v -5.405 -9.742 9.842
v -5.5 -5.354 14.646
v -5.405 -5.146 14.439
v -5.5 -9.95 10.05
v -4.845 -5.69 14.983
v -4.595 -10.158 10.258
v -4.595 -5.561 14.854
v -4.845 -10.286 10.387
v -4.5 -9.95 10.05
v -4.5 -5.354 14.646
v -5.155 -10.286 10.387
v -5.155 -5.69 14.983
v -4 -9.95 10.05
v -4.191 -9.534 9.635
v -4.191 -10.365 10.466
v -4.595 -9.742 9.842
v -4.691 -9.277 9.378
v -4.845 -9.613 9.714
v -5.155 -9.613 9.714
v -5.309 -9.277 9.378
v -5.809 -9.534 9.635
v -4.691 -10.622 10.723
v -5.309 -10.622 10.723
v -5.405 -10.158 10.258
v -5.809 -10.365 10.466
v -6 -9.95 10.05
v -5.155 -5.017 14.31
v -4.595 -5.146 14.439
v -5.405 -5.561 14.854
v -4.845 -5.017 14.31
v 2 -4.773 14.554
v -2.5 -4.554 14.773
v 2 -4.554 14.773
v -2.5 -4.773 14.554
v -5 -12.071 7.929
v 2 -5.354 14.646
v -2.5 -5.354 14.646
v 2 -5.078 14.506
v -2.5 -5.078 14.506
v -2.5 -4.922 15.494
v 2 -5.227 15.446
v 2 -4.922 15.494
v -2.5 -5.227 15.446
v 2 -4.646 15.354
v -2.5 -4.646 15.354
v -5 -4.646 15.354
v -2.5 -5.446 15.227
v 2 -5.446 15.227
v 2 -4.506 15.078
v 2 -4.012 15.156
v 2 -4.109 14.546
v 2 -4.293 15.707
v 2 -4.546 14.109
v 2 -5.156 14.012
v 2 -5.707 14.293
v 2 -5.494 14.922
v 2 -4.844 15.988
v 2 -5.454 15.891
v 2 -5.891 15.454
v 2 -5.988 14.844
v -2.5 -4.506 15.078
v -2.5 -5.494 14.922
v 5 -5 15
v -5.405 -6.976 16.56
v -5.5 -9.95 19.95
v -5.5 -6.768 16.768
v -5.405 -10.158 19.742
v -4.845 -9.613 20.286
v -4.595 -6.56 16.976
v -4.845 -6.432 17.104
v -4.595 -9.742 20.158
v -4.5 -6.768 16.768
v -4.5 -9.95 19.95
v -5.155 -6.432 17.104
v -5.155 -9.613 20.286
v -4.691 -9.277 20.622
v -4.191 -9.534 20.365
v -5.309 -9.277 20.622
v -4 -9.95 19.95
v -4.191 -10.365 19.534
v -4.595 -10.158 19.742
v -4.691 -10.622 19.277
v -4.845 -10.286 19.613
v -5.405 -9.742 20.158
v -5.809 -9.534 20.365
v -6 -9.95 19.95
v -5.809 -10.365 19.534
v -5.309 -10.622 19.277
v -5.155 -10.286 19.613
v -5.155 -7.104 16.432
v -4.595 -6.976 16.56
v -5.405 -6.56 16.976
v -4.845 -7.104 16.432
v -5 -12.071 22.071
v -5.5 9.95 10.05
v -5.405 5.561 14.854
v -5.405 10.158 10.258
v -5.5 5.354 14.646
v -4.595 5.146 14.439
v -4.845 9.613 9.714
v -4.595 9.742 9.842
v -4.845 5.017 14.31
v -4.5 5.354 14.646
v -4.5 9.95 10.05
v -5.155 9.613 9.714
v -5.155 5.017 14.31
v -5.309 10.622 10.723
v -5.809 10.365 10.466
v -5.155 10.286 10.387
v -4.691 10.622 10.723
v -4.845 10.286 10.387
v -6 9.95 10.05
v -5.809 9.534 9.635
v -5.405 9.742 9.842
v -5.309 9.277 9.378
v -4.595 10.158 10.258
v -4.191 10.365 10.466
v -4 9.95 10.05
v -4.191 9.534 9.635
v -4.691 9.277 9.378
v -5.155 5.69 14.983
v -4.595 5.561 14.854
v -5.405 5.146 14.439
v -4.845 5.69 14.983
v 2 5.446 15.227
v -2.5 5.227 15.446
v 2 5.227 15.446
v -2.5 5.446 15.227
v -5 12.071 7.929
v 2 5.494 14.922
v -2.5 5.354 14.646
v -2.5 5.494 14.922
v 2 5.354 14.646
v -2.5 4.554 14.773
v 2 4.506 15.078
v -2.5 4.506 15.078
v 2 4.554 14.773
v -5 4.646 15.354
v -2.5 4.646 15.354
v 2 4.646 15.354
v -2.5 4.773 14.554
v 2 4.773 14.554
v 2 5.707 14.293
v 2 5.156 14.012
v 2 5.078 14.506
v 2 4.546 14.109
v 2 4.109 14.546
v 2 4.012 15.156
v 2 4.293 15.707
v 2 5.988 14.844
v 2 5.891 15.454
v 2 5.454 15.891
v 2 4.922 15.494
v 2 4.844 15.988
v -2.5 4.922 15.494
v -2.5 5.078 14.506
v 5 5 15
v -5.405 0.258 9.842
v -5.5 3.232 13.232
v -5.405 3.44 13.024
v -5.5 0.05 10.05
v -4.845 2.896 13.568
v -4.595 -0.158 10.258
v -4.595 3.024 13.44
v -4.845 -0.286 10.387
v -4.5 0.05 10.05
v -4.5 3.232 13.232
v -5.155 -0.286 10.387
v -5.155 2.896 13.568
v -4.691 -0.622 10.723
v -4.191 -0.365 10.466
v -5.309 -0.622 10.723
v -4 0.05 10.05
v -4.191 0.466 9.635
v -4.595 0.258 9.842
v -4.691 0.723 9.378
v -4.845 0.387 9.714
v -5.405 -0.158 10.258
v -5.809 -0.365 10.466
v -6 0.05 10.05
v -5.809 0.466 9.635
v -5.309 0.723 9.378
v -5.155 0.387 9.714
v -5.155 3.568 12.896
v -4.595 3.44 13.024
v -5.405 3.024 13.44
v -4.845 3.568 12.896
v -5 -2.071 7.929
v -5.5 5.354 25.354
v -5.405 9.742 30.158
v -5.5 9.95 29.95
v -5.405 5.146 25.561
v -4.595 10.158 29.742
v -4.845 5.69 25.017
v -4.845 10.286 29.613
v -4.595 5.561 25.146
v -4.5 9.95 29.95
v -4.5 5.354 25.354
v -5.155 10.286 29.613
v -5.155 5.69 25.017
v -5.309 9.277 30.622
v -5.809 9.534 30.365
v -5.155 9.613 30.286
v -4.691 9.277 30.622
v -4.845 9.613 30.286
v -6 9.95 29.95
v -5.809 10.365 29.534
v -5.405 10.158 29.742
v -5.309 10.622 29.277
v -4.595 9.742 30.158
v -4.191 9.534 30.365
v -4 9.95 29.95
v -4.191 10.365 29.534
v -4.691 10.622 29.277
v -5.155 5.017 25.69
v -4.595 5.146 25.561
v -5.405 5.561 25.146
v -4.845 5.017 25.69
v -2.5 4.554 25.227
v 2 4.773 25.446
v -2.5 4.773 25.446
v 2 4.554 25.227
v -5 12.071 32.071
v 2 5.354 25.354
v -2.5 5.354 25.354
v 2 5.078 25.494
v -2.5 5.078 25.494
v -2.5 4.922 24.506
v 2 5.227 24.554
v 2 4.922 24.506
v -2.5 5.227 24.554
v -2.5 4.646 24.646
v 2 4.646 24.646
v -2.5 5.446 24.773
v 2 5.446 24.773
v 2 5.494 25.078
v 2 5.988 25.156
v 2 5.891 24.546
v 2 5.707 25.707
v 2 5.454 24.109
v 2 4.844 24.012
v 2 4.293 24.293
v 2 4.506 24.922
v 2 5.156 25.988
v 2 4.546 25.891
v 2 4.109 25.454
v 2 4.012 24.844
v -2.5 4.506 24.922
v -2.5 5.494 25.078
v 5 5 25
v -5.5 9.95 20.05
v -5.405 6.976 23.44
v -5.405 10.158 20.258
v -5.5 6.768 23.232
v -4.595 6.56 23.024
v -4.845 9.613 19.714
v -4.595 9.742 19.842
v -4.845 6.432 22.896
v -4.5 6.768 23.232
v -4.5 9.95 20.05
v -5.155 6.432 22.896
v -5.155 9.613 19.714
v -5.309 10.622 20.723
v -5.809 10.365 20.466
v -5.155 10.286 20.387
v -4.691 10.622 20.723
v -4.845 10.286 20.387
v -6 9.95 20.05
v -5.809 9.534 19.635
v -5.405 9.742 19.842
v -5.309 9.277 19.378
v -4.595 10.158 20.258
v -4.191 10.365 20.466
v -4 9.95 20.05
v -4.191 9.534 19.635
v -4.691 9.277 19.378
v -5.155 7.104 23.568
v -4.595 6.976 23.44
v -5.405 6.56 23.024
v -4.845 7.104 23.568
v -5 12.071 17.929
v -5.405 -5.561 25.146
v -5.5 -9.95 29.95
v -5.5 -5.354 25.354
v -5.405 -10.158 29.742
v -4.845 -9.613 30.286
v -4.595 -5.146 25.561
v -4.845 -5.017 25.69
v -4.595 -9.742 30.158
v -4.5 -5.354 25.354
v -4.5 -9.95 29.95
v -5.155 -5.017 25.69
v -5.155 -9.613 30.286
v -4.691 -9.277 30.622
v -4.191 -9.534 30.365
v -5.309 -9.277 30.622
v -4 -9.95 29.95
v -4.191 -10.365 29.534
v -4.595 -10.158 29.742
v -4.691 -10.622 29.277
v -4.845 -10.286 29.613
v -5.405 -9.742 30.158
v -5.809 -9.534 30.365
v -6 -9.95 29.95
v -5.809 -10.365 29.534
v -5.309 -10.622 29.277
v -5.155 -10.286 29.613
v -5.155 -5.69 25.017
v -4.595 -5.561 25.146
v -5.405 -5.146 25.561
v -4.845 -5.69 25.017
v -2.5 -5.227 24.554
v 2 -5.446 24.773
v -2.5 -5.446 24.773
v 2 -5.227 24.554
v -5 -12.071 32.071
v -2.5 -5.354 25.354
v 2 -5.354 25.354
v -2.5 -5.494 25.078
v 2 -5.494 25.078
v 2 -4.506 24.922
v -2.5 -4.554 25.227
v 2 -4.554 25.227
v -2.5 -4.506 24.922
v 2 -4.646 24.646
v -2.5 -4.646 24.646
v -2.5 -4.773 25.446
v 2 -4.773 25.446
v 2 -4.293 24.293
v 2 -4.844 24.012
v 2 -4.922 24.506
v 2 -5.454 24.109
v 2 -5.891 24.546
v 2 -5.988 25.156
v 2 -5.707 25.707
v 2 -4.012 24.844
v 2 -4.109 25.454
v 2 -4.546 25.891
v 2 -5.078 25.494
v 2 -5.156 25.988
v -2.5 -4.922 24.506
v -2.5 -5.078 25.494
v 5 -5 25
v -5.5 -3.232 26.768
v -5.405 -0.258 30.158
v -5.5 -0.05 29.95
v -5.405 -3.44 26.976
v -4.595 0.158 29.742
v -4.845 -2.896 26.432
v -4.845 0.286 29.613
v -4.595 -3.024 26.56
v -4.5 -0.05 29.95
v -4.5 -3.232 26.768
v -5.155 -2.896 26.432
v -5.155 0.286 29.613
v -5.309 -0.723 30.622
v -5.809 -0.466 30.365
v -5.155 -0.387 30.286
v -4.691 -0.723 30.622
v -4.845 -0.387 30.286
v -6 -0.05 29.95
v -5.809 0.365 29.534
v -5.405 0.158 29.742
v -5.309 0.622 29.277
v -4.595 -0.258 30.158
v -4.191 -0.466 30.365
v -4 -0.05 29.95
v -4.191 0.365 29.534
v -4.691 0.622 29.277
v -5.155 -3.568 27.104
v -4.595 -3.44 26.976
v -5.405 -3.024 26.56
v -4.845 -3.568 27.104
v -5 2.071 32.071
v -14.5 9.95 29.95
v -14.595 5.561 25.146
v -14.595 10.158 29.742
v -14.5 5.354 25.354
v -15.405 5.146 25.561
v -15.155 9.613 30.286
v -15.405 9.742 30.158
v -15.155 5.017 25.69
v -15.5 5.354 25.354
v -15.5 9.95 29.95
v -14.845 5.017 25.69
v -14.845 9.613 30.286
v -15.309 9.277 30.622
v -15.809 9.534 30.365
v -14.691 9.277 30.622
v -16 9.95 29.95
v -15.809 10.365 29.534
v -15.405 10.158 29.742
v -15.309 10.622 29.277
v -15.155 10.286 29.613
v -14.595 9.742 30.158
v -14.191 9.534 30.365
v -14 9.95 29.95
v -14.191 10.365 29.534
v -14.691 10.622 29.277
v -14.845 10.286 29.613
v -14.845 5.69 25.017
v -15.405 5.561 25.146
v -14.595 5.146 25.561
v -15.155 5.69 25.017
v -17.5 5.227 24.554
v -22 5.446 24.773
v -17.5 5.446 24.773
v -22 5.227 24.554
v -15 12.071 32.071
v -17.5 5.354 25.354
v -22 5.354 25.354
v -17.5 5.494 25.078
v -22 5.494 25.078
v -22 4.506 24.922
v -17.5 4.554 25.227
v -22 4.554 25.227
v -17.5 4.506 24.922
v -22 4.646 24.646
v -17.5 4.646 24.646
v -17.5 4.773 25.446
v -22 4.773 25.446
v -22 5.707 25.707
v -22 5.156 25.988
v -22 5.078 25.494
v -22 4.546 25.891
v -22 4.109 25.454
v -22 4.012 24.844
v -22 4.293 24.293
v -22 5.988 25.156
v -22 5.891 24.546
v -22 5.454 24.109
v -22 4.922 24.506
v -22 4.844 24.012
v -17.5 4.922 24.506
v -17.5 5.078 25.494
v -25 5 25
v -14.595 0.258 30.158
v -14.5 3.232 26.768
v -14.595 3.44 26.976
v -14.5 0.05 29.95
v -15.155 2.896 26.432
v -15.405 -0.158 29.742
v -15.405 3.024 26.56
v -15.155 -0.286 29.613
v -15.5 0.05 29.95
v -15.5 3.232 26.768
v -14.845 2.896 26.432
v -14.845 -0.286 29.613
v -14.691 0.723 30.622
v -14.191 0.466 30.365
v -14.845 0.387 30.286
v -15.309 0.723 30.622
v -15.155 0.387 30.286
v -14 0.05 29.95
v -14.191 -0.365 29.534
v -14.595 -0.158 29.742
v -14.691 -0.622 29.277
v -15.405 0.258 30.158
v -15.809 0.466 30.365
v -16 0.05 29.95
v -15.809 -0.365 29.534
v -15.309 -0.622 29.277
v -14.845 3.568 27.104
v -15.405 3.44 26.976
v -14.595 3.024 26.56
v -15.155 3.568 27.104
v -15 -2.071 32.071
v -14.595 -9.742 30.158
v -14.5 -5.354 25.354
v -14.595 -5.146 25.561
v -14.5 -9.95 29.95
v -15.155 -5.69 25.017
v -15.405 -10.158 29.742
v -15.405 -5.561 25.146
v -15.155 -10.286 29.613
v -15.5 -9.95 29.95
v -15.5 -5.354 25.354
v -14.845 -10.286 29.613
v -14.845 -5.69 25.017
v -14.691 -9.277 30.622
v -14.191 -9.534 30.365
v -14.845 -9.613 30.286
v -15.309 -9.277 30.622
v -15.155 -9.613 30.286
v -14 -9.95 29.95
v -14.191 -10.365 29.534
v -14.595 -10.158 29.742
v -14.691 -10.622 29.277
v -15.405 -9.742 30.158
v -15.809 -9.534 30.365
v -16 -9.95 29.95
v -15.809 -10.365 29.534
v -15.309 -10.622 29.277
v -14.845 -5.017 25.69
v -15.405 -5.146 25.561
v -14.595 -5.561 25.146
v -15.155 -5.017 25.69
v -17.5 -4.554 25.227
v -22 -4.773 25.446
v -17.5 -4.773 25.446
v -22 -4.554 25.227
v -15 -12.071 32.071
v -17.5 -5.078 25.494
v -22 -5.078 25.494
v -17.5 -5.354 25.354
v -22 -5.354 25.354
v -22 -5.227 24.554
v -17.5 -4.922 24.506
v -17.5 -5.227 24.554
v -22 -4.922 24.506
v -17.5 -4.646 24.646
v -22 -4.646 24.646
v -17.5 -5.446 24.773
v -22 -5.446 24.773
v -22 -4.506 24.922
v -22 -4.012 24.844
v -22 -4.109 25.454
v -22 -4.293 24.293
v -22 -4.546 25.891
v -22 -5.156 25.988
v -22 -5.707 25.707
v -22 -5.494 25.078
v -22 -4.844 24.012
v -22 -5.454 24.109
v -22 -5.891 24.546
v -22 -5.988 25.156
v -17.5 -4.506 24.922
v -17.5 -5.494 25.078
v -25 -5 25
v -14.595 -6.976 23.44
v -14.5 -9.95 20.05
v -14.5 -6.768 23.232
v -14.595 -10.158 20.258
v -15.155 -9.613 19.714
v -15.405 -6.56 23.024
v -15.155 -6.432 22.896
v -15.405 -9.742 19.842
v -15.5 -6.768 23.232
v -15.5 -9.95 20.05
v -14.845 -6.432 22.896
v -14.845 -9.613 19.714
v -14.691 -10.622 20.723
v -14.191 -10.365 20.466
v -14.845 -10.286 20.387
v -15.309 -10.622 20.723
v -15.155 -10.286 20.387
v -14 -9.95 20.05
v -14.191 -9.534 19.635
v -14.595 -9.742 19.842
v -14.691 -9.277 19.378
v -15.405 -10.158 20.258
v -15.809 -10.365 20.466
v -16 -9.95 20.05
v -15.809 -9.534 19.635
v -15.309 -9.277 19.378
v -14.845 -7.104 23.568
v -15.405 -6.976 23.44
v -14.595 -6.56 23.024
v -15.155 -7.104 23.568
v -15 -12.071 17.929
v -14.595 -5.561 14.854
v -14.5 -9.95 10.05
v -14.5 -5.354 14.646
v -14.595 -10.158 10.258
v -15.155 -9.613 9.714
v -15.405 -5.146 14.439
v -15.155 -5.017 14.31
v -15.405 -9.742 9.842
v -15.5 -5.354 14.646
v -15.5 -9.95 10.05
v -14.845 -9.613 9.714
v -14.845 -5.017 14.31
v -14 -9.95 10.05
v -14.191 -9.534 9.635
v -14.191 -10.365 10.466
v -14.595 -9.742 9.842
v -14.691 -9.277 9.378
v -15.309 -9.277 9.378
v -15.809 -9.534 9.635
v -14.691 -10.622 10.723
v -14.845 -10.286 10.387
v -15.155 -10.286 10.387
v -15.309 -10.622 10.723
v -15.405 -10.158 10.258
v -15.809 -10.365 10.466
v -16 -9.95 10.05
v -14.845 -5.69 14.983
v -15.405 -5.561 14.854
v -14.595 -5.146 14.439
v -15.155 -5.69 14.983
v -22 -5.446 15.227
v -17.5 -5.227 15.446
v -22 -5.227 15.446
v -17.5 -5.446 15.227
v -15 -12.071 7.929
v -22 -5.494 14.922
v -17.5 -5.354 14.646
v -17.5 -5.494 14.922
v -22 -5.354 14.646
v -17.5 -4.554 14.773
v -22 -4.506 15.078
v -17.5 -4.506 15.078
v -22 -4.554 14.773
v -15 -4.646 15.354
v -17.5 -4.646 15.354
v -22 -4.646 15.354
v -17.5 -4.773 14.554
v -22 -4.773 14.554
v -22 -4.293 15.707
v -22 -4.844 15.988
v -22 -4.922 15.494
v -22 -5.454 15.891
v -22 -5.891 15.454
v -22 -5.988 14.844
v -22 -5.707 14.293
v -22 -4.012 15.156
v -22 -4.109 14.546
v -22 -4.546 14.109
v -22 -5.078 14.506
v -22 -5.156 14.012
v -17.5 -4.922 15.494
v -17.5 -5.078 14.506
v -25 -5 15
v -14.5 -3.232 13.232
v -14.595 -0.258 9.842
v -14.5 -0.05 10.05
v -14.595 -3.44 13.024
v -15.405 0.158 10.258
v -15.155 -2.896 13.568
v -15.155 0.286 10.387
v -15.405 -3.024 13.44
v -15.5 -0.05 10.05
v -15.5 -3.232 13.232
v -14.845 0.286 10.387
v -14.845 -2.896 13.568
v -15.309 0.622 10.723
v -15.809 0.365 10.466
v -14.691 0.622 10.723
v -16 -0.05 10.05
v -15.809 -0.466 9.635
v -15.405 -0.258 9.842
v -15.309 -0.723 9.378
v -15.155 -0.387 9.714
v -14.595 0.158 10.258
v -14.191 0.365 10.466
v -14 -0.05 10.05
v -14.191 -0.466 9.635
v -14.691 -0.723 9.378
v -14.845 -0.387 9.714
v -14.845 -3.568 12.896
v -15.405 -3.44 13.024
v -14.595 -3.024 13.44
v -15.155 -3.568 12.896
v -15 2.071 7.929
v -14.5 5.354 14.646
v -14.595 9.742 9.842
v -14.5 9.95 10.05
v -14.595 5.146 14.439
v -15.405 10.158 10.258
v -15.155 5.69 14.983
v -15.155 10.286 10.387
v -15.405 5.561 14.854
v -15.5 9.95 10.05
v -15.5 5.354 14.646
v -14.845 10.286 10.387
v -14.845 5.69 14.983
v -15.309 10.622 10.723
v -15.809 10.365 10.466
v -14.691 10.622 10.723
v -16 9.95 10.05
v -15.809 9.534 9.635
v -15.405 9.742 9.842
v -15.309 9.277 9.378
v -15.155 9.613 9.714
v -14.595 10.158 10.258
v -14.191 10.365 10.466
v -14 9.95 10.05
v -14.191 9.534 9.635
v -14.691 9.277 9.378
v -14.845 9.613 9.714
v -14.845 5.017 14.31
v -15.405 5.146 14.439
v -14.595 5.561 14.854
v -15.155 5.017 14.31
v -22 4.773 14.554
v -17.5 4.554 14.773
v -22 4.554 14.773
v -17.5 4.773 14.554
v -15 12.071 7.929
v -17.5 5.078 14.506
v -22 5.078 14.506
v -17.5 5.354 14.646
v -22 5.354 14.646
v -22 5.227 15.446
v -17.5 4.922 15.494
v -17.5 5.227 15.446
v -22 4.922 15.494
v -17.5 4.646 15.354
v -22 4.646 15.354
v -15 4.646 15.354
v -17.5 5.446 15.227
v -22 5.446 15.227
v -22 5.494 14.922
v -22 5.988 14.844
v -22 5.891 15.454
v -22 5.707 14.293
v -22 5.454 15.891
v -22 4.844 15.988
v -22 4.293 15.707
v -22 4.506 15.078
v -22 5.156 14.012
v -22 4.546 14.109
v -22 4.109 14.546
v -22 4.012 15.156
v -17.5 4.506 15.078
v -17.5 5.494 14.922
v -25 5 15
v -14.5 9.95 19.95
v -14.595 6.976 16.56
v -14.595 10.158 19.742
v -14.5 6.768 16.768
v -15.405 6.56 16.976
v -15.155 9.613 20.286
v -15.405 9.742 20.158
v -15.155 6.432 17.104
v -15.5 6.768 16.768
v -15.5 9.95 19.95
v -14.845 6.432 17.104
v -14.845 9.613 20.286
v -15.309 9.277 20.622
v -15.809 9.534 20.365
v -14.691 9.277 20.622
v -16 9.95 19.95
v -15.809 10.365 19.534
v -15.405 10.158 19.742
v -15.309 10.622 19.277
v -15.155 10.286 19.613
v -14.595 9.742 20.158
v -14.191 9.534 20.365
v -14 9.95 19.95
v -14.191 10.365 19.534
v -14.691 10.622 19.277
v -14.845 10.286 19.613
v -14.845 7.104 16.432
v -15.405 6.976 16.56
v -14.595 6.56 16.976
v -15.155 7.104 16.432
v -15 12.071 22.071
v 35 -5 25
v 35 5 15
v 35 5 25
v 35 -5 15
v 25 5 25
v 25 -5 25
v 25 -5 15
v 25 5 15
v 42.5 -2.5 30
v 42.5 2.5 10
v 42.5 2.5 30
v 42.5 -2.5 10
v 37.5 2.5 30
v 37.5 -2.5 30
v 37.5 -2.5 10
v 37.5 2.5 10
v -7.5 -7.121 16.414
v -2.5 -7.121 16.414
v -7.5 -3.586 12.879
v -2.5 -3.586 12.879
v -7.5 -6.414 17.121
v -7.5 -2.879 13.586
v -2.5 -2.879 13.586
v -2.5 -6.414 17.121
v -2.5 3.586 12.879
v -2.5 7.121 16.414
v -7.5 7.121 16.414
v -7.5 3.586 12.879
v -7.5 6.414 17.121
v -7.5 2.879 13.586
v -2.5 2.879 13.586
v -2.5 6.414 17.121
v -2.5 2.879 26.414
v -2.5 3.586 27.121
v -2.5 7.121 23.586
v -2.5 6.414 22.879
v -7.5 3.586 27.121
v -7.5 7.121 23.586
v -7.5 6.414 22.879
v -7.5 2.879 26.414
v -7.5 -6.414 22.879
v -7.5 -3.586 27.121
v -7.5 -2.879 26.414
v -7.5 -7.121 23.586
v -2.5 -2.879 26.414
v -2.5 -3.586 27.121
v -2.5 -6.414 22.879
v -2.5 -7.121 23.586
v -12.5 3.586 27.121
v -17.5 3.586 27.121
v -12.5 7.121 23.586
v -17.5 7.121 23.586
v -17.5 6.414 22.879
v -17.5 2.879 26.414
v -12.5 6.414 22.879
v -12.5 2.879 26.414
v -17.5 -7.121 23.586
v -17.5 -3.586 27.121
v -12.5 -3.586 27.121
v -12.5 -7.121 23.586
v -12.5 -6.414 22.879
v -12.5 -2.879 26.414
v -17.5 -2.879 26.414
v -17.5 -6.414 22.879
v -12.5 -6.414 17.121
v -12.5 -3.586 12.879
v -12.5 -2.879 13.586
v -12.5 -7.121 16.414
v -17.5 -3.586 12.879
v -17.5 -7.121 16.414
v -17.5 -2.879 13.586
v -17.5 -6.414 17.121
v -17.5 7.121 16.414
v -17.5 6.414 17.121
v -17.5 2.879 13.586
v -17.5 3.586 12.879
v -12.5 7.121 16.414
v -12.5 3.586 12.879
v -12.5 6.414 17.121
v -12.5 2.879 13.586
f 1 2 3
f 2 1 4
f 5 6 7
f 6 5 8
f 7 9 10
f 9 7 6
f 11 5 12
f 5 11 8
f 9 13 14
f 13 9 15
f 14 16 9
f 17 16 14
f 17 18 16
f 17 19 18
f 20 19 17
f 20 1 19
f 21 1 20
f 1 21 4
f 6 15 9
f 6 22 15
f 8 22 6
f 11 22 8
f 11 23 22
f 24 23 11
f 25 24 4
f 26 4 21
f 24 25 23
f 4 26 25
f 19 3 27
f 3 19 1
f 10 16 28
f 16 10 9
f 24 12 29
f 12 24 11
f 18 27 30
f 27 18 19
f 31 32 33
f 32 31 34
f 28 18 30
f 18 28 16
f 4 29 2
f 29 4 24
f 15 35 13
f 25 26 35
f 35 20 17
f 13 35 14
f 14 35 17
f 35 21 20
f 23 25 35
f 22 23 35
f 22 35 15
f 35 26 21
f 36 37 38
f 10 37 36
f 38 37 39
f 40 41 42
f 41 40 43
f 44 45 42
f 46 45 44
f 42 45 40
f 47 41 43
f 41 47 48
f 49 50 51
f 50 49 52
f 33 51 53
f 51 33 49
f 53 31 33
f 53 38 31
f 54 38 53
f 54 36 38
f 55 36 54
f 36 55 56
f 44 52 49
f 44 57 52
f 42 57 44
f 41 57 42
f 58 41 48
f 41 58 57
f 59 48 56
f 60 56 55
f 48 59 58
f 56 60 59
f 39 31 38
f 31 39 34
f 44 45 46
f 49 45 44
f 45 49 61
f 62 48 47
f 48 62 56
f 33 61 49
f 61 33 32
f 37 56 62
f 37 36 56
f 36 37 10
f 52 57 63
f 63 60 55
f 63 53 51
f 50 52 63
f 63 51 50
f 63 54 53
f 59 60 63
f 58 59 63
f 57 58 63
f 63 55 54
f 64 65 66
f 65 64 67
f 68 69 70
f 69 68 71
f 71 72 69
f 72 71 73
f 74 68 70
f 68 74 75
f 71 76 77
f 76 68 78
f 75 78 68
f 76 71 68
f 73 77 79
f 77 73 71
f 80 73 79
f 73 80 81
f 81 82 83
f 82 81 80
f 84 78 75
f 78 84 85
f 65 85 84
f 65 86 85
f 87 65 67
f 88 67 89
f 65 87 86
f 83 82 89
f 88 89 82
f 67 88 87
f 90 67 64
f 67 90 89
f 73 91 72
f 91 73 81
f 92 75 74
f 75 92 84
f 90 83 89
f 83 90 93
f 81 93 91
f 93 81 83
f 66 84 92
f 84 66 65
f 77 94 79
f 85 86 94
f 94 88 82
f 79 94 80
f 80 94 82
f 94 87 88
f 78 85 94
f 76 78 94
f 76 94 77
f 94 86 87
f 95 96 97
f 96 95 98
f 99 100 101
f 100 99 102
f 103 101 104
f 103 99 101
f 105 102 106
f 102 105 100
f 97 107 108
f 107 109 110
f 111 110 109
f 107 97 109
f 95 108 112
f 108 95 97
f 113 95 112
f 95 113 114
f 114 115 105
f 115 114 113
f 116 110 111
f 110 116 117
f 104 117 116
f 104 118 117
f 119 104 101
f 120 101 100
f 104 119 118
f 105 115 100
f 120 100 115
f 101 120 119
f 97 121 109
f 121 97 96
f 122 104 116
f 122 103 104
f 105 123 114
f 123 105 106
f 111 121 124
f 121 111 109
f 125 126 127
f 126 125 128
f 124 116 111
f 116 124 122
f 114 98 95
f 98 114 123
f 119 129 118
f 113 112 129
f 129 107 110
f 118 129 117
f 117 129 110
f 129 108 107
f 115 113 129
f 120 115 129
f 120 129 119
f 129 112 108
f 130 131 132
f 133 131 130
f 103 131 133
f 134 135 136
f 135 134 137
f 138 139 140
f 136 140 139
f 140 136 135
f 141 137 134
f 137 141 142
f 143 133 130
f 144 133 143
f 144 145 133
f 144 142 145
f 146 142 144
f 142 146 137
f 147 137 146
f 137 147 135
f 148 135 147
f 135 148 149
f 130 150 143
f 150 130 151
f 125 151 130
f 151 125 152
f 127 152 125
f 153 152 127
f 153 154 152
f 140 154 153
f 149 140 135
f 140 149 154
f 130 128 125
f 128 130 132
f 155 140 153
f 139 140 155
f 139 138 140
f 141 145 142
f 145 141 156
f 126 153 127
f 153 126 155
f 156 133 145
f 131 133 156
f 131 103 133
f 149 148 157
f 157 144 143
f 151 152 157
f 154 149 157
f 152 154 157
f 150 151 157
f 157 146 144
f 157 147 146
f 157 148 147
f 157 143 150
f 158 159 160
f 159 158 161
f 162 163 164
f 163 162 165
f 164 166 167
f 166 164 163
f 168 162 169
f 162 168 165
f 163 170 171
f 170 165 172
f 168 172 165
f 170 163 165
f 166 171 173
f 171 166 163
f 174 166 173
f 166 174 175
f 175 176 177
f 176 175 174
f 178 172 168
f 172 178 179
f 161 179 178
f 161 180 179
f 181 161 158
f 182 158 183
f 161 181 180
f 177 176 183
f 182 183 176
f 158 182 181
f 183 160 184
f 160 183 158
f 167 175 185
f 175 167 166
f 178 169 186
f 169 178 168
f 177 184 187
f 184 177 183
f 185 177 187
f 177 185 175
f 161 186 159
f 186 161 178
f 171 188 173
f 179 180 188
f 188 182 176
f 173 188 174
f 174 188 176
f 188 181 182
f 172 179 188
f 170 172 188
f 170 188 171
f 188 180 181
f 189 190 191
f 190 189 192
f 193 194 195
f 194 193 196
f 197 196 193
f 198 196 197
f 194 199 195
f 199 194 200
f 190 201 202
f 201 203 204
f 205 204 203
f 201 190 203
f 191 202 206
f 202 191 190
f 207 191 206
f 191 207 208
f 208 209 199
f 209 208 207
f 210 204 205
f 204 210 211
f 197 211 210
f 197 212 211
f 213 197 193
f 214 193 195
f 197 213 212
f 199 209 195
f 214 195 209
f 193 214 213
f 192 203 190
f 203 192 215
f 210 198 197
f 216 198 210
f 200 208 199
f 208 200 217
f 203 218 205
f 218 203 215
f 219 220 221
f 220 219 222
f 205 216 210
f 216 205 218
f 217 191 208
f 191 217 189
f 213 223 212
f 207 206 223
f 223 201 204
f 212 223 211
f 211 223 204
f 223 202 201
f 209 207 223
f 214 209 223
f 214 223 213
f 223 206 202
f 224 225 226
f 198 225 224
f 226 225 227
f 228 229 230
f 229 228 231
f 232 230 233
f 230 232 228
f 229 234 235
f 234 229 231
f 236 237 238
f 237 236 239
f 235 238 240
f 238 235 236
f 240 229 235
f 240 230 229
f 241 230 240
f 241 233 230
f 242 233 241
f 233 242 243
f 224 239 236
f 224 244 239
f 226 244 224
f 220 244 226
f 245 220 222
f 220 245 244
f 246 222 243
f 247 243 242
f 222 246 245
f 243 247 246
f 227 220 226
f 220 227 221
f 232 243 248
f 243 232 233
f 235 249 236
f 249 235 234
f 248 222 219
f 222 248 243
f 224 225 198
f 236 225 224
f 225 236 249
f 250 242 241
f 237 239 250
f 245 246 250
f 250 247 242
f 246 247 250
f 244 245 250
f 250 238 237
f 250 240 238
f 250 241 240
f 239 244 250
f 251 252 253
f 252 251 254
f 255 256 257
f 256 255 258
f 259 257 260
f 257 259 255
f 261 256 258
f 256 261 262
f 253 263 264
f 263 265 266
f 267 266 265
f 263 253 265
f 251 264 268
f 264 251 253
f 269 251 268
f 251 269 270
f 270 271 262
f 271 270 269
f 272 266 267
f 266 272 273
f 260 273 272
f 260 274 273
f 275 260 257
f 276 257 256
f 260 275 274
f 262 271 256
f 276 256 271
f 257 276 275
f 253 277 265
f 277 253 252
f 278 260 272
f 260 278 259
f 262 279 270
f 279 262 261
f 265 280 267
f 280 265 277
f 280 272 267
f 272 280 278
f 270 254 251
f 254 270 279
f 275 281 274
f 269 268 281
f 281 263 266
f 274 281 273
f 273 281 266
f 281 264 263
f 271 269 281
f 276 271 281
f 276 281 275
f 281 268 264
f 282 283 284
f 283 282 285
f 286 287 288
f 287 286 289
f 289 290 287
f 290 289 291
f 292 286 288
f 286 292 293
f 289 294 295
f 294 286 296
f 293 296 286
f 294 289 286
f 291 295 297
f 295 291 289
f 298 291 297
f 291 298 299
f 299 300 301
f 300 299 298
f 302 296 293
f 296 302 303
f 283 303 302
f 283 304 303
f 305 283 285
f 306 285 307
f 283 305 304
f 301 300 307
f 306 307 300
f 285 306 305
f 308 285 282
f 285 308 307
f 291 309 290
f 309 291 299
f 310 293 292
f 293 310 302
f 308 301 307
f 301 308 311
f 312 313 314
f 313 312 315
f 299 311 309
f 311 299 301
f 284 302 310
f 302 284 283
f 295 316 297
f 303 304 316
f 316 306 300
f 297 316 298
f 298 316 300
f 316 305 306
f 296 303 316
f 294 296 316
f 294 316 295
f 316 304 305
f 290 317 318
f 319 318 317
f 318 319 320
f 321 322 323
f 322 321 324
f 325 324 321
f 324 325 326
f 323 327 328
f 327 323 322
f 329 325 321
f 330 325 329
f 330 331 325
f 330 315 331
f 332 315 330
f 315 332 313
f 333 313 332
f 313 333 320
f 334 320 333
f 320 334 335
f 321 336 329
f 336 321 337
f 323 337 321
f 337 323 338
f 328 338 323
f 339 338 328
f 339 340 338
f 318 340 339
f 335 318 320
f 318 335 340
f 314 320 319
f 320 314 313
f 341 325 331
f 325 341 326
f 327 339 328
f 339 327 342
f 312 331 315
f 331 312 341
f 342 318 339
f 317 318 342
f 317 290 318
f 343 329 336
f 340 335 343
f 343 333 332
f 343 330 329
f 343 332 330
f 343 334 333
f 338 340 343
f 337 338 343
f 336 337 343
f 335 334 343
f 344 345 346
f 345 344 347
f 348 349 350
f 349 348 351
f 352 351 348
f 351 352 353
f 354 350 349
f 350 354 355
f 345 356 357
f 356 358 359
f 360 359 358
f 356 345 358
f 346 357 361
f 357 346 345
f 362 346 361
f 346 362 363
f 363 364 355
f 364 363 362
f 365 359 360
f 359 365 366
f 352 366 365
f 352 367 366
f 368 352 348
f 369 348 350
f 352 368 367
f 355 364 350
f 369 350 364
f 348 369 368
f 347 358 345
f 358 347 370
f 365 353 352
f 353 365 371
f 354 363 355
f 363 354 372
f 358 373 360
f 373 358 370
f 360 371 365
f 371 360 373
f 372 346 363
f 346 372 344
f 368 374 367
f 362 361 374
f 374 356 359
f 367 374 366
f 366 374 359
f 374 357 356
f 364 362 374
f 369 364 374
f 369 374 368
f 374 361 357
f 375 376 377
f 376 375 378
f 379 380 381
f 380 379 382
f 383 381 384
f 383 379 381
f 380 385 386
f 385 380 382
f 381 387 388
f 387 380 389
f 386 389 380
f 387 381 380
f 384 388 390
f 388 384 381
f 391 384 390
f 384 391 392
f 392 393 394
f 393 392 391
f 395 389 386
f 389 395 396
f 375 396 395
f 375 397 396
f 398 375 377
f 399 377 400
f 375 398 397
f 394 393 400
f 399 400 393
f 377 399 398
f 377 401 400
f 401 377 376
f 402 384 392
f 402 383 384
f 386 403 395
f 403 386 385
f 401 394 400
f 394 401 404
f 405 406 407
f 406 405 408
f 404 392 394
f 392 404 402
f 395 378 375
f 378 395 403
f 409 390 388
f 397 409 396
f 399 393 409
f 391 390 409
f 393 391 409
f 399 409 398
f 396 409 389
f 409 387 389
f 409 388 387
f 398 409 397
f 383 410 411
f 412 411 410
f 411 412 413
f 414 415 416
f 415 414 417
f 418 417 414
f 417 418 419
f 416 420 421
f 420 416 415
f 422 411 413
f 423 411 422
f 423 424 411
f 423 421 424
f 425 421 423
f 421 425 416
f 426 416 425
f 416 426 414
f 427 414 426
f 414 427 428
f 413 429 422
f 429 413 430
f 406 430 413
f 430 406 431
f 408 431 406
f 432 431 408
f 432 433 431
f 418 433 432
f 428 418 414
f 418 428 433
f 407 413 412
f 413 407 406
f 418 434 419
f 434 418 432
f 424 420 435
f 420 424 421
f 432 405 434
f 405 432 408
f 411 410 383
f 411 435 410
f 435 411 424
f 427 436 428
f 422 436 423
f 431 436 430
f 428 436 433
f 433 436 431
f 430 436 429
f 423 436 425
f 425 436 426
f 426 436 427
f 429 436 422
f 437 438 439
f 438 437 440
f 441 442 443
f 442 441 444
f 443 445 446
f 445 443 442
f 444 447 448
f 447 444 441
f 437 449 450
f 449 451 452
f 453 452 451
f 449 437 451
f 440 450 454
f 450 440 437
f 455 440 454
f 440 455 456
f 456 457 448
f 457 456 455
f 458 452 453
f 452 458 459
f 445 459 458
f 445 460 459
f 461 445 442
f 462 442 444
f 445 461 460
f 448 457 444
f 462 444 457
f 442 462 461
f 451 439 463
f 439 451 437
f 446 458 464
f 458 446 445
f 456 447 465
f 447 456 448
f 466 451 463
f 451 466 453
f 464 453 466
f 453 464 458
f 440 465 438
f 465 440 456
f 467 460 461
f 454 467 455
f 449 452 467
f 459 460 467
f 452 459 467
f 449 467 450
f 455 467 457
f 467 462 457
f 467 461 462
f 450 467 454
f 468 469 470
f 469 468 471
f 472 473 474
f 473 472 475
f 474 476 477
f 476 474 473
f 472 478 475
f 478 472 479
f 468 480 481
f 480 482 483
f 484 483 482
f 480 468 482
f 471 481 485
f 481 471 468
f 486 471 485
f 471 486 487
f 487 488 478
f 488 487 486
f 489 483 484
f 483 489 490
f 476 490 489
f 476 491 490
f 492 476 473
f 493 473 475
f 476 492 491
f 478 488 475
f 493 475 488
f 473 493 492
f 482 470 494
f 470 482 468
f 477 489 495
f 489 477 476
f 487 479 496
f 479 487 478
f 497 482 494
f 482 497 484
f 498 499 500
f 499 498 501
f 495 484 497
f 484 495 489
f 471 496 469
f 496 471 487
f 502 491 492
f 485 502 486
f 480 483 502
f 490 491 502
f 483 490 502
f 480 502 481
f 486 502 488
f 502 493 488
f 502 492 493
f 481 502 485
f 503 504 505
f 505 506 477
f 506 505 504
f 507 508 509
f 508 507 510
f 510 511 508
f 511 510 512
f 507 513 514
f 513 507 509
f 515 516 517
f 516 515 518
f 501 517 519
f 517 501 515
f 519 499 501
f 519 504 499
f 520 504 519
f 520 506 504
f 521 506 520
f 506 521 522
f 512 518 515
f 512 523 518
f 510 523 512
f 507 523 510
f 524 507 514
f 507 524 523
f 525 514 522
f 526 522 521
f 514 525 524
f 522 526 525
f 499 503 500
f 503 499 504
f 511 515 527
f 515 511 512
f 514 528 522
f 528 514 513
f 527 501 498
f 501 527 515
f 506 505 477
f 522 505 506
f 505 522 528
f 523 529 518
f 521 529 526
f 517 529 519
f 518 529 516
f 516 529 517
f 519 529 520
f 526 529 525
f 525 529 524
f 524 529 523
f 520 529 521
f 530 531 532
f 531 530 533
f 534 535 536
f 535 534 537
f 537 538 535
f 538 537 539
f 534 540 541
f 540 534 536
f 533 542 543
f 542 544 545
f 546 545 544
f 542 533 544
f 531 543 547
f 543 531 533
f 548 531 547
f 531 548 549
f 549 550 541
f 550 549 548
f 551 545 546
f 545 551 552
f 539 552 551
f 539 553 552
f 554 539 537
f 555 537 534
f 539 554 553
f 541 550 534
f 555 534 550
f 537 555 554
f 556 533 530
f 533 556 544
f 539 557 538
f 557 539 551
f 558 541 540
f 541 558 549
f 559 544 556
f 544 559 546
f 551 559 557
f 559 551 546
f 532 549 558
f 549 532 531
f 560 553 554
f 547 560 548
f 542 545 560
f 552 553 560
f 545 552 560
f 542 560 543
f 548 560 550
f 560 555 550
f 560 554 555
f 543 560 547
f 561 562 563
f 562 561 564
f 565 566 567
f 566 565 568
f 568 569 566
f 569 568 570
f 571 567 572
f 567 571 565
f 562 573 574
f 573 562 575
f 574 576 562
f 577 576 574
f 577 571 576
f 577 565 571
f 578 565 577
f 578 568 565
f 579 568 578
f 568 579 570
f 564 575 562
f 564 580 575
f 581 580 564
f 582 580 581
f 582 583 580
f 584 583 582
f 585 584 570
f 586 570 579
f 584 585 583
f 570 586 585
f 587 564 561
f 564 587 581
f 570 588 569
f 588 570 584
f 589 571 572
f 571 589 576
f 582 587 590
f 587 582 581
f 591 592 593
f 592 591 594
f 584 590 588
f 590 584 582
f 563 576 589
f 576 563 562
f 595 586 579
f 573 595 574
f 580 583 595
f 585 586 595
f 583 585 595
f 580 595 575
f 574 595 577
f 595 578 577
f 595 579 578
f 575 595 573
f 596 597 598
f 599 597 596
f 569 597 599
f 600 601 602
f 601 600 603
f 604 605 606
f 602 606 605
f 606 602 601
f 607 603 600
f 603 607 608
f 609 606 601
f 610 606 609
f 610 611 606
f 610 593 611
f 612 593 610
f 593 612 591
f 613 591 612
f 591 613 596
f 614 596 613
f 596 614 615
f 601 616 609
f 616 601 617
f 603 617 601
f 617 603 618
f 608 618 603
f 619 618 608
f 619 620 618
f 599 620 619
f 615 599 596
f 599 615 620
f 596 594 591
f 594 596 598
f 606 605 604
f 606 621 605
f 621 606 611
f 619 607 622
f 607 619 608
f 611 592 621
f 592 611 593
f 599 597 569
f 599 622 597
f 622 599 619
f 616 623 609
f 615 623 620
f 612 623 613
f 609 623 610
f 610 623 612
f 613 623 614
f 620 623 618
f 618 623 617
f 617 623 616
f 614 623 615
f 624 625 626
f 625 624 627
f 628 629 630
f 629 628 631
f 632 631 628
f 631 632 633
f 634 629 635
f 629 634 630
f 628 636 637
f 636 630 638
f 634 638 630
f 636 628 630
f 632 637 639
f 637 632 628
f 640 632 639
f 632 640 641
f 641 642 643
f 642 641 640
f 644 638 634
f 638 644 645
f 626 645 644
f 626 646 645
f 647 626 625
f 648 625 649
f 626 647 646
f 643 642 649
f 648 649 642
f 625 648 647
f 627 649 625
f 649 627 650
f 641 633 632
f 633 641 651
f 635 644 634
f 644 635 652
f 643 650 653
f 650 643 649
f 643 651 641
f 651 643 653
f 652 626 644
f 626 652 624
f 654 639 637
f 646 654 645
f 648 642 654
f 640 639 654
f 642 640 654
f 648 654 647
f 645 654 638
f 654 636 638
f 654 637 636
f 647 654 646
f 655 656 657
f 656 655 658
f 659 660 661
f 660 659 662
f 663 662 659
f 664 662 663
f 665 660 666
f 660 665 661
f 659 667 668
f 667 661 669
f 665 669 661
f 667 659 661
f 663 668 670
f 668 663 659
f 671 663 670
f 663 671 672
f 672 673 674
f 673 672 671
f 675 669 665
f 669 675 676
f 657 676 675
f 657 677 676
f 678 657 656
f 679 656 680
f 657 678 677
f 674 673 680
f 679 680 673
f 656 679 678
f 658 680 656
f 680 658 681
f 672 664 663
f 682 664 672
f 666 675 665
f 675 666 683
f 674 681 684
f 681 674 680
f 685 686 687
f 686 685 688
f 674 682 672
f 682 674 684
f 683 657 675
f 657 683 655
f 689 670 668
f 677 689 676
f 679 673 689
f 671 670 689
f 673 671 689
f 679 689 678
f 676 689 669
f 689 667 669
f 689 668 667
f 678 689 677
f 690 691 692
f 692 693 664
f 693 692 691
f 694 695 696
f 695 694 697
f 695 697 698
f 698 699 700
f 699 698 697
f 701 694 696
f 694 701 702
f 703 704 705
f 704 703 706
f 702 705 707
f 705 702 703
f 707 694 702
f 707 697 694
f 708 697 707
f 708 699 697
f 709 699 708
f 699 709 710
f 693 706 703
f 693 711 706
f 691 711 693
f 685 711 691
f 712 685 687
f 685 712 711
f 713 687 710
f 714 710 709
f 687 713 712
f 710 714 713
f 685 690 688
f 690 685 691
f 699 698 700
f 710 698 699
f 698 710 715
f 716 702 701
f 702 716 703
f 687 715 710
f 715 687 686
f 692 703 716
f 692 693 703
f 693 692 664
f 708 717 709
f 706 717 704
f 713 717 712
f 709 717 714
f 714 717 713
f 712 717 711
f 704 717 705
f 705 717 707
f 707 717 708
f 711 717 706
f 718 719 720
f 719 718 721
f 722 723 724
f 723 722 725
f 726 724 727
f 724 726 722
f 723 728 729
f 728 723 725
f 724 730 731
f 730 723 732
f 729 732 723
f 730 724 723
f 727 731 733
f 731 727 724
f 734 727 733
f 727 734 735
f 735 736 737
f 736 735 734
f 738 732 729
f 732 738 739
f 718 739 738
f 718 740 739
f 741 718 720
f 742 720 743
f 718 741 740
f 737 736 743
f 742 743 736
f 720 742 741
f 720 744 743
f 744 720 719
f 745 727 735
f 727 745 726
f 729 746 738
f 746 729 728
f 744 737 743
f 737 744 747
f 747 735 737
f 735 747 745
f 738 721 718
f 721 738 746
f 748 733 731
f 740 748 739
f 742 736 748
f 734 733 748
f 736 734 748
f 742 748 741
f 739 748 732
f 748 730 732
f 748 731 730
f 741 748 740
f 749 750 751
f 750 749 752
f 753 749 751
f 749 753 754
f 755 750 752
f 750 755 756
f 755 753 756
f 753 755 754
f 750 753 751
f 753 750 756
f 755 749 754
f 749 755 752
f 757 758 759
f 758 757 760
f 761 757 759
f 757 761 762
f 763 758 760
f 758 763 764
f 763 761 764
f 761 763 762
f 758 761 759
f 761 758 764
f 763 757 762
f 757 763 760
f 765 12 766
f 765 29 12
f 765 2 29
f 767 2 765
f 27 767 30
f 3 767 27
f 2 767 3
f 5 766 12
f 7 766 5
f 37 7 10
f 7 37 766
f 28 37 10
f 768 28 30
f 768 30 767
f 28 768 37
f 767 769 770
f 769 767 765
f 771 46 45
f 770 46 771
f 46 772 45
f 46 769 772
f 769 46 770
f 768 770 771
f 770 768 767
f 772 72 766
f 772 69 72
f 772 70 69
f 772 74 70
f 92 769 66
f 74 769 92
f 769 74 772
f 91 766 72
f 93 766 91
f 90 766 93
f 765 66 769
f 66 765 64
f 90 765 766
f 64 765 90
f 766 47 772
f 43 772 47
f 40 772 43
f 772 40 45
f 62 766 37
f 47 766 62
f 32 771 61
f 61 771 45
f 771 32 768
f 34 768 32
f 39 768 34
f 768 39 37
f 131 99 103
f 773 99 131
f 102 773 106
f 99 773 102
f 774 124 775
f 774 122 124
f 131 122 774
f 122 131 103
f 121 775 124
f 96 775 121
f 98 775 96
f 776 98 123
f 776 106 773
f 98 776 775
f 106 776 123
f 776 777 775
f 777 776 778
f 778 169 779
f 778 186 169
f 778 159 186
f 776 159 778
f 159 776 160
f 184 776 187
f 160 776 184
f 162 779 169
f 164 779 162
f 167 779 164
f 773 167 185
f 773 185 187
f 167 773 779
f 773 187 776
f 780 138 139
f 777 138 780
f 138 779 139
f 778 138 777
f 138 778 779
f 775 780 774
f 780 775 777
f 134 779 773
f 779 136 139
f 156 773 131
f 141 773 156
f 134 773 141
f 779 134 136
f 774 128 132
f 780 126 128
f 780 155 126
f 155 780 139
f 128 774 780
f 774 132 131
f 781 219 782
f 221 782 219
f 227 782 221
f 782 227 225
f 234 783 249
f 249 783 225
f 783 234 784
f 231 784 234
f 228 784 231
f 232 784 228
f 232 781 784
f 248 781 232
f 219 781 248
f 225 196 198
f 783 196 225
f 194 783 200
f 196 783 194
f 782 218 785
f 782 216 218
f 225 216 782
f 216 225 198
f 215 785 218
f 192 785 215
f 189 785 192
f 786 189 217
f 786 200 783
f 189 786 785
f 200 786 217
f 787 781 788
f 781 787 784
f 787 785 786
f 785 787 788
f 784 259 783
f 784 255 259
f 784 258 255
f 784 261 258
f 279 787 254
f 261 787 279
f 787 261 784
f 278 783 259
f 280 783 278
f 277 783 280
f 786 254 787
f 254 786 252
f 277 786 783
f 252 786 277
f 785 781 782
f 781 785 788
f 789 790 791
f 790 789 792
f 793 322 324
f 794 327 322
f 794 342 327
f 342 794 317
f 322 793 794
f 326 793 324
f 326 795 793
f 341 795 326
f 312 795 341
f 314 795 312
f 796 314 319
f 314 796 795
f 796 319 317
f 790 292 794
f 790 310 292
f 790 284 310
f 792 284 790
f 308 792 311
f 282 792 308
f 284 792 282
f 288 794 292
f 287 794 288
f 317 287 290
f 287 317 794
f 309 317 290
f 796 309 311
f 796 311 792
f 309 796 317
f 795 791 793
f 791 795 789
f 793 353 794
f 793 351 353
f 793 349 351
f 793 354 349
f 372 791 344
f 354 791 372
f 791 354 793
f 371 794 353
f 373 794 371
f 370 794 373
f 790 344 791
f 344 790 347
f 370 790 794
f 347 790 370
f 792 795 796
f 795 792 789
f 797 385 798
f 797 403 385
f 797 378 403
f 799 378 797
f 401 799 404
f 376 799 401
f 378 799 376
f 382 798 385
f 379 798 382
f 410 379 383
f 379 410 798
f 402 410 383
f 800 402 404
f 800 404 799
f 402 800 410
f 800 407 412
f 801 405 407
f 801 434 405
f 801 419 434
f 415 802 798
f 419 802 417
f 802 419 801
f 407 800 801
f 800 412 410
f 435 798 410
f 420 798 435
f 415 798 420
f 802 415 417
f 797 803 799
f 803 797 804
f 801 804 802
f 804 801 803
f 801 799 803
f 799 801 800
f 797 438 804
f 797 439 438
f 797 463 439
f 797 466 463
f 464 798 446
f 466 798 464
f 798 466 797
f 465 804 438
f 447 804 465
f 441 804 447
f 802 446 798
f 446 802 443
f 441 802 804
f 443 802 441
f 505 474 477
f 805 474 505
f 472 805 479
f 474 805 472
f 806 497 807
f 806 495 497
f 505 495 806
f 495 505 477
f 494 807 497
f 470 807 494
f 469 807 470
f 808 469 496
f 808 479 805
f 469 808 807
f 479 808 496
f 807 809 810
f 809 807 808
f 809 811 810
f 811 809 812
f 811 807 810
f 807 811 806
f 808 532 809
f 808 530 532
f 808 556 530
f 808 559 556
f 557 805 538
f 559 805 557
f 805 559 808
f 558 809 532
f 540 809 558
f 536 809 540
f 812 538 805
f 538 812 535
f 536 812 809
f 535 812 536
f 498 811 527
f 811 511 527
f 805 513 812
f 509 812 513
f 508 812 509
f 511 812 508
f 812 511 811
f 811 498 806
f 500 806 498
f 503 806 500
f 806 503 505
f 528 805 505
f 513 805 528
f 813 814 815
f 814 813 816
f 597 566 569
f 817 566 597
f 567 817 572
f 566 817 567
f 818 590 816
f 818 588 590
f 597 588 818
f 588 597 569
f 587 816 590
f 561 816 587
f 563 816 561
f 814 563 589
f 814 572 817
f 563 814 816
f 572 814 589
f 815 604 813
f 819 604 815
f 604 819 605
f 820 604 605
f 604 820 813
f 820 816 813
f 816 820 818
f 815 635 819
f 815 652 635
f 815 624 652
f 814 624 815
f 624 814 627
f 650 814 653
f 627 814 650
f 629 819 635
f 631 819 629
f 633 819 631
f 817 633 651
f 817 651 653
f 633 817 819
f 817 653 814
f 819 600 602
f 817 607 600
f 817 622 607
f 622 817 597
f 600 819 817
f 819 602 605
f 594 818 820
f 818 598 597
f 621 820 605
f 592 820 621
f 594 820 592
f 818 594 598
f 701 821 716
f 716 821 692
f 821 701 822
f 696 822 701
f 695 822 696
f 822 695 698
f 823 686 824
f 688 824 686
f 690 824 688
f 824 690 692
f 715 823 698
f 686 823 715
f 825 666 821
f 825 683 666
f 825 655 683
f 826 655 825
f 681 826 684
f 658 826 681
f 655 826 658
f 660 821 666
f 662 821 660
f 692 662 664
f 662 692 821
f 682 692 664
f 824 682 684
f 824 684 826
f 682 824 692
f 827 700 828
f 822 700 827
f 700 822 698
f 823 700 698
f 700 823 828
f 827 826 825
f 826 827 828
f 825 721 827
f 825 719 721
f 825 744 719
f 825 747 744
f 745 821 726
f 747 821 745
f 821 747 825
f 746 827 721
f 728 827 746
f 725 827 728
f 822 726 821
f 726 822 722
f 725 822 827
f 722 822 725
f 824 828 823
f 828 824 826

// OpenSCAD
union() {
  translate(v=[-5.000, -5.000, 15.000]) {
  rotate([-45.000,-180.000,-180.000]){
    union() {
      color([1.000, 0.000, 0.000, 1.000]) {
        translate(v=[0.000, 0.000, 0.000]) {
        rotate([-180.000,90.000,-180.000]){
          union() {
            cylinder(h=7.000, r1=0.500, r2=0.500, $fn=10, center=false);
            translate(v=[0.000, 0.000, 7.000]) {
            rotate([-180.000,-180.000,-180.000]){
              cylinder(h=3.000, r1=1.000, r2=0.000, $fn=10, center=false);
            } // End rotate
            } // End translate
          } // End union
        } // End rotate
        } // End translate
      } // End color
      color([0.000, 1.000, 0.000, 1.000]) {
        translate(v=[0.000, 0.000, 0.000]) {
        rotate([90.000,-180.000,-180.000]){
          union() {
            cylinder(h=7.000, r1=0.500, r2=0.500, $fn=10, center=false);
            translate(v=[0.000, 0.000, 7.000]) {
            rotate([-180.000,-180.000,-180.000]){
              cylinder(h=3.000, r1=1.000, r2=0.000, $fn=10, center=false);
            } // End rotate
            } // End translate
          } // End union
        } // End rotate
        } // End translate
      } // End color
      color([0.000, 0.000, 1.000, 1.000]) {
        union() {
          cylinder(h=7.000, r1=0.500, r2=0.500, $fn=10, center=false);
          translate(v=[0.000, 0.000, 7.000]) {
          rotate([-180.000,-180.000,-180.000]){
            cylinder(h=3.000, r1=1.000, r2=0.000, $fn=10, center=false);
          } // End rotate
          } // End translate
        } // End union
      } // End color
    } // End union
  } // End rotate
  } // End translate
  translate(v=[-5.000, 5.000, 15.000]) {
  rotate([45.000,-180.000,-180.000]){
    union() {
      color([1.000, 0.000, 0.000, 1.000]) {
        translate(v=[0.000, 0.000, 0.000]) {
        rotate([-180.000,90.000,-180.000]){
          union() {
            cylinder(h=7.000, r1=0.500, r2=0.500, $fn=10, center=false);
            translate(v=[0.000, 0.000, 7.000]) {
            rotate([-180.000,-180.000,-180.000]){
              cylinder(h=3.000, r1=1.000, r2=0.000, $fn=10, center=false);
            } // End rotate
            } // End translate
          } // End union
        } // End rotate
        } // End translate
      } // End color
      color([0.000, 1.000, 0.000, 1.000]) {
        translate(v=[0.000, 0.000, 0.000]) {
        rotate([90.000,-180.000,-180.000]){
          union() {
            cylinder(h=7.000, r1=0.500, r2=0.500, $fn=10, center=false);
            translate(v=[0.000, 0.000, 7.000]) {
            rotate([-180.000,-180.000,-180.000]){
              cylinder(h=3.000, r1=1.000, r2=0.000, $fn=10, center=false);
            } // End rotate
            } // End translate
          } // End union
        } // End rotate
        } // End translate
      } // End color
      color([0.000, 0.000, 1.000, 1.000]) {
        union() {
          cylinder(h=7.000, r1=0.500, r2=0.500, $fn=10, center=false);
          translate(v=[0.000, 0.000, 7.000]) {
          rotate([-180.000,-180.000,-180.000]){
            cylinder(h=3.000, r1=1.000, r2=0.000, $fn=10, center=false);
          } // End rotate
          } // End translate
        } // End union
      } // End color
    } // End union
  } // End rotate
  } // End translate
  translate(v=[-5.000, 5.000, 25.000]) {
  rotate([135.000,-180.000,-180.000]){
    union() {
      color([1.000, 0.000, 0.000, 1.000]) {
        translate(v=[0.000, 0.000, 0.000]) {
        rotate([-180.000,90.000,-180.000]){
          union() {
            cylinder(h=7.000, r1=0.500, r2=0.500, $fn=10, center=false);
            translate(v=[0.000, 0.000, 7.000]) {
            rotate([-180.000,-180.000,-180.000]){
              cylinder(h=3.000, r1=1.000, r2=0.000, $fn=10, center=false);
            } // End rotate
            } // End translate
          } // End union
        } // End rotate
        } // End translate
      } // End color
      color([0.000, 1.000, 0.000, 1.000]) {
        translate(v=[0.000, 0.000, 0.000]) {
        rotate([90.000,-180.000,-180.000]){
          union() {
            cylinder(h=7.000, r1=0.500, r2=0.500, $fn=10, center=false);
            translate(v=[0.000, 0.000, 7.000]) {
            rotate([-180.000,-180.000,-180.000]){
              cylinder(h=3.000, r1=1.000, r2=0.000, $fn=10, center=false);
            } // End rotate
            } // End translate
          } // End union
        } // End rotate
        } // End translate
      } // End color
      color([0.000, 0.000, 1.000, 1.000]) {
        union() {
          cylinder(h=7.000, r1=0.500, r2=0.500, $fn=10, center=false);
          translate(v=[0.000, 0.000, 7.000]) {
          rotate([-180.000,-180.000,-180.000]){
            cylinder(h=3.000, r1=1.000, r2=0.000, $fn=10, center=false);
          } // End rotate
          } // End translate
        } // End union
      } // End color
    } // End union
  } // End rotate
  } // End translate
  translate(v=[-5.000, -5.000, 25.000]) {
  rotate([-135.000,-180.000,-180.000]){
    union() {
      color([1.000, 0.000, 0.000, 1.000]) {
        translate(v=[0.000, 0.000, 0.000]) {
        rotate([-180.000,90.000,-180.000]){
          union() {
            cylinder(h=7.000, r1=0.500, r2=0.500, $fn=10, center=false);
            translate(v=[0.000, 0.000, 7.000]) {
            rotate([-180.000,-180.000,-180.000]){
              cylinder(h=3.000, r1=1.000, r2=0.000, $fn=10, center=false);
            } // End rotate
            } // End translate
          } // End union
        } // End rotate
        } // End translate
      } // End color
      color([0.000, 1.000, 0.000, 1.000]) {
        translate(v=[0.000, 0.000, 0.000]) {
        rotate([90.000,-180.000,-180.000]){
          union() {
            cylinder(h=7.000, r1=0.500, r2=0.500, $fn=10, center=false);
            translate(v=[0.000, 0.000, 7.000]) {
            rotate([-180.000,-180.000,-180.000]){
              cylinder(h=3.000, r1=1.000, r2=0.000, $fn=10, center=false);
            } // End rotate
            } // End translate
          } // End union
        } // End rotate
        } // End translate
      } // End color
      color([0.000, 0.000, 1.000, 1.000]) {
        union() {
          cylinder(h=7.000, r1=0.500, r2=0.500, $fn=10, center=false);
          translate(v=[0.000, 0.000, 7.000]) {
          rotate([-180.000,-180.000,-180.000]){
            cylinder(h=3.000, r1=1.000, r2=0.000, $fn=10, center=false);
          } // End rotate
          } // End translate
        } // End union
      } // End color
    } // End union
  } // End rotate
  } // End translate
  translate(v=[-15.000, 5.000, 25.000]) {
  rotate([-135.000,180.000,0.000]){
    union() {
      color([1.000, 0.000, 0.000, 1.000]) {
        translate(v=[0.000, 0.000, 0.000]) {
        rotate([-180.000,90.000,-180.000]){
          union() {
            cylinder(h=7.000, r1=0.500, r2=0.500, $fn=10, center=false);
            translate(v=[0.000, 0.000, 7.000]) {
            rotate([-180.000,-180.000,-180.000]){
              cylinder(h=3.000, r1=1.000, r2=0.000, $fn=10, center=false);
            } // End rotate
            } // End translate
          } // End union
        } // End rotate
        } // End translate
      } // End color
      color([0.000, 1.000, 0.000, 1.000]) {
        translate(v=[0.000, 0.000, 0.000]) {
        rotate([90.000,-180.000,-180.000]){
          union() {
            cylinder(h=7.000, r1=0.500, r2=0.500, $fn=10, center=false);
            translate(v=[0.000, 0.000, 7.000]) {
            rotate([-180.000,-180.000,-180.000]){
              cylinder(h=3.000, r1=1.000, r2=0.000, $fn=10, center=false);
            } // End rotate
            } // End translate
          } // End union
        } // End rotate
        } // End translate
      } // End color
      color([0.000, 0.000, 1.000, 1.000]) {
        union() {
          cylinder(h=7.000, r1=0.500, r2=0.500, $fn=10, center=false);
          translate(v=[0.000, 0.000, 7.000]) {
          rotate([-180.000,-180.000,-180.000]){
            cylinder(h=3.000, r1=1.000, r2=0.000, $fn=10, center=false);
          } // End rotate
          } // End translate
        } // End union
      } // End color
    } // End union
  } // End rotate
  } // End translate
  translate(v=[-15.000, -5.000, 25.000]) {
  rotate([135.000,180.000,0.000]){
    union() {
      color([1.000, 0.000, 0.000, 1.000]) {
        translate(v=[0.000, 0.000, 0.000]) {
        rotate([-180.000,90.000,-180.000]){
          union() {
            cylinder(h=7.000, r1=0.500, r2=0.500, $fn=10, center=false);
            translate(v=[0.000, 0.000, 7.000]) {
            rotate([-180.000,-180.000,-180.000]){
              cylinder(h=3.000, r1=1.000, r2=0.000, $fn=10, center=false);
            } // End rotate
            } // End translate
          } // End union
        } // End rotate
        } // End translate
      } // End color
      color([0.000, 1.000, 0.000, 1.000]) {
        translate(v=[0.000, 0.000, 0.000]) {
        rotate([90.000,-180.000,-180.000]){
          union() {
            cylinder(h=7.000, r1=0.500, r2=0.500, $fn=10, center=false);
            translate(v=[0.000, 0.000, 7.000]) {
            rotate([-180.000,-180.000,-180.000]){
              cylinder(h=3.000, r1=1.000, r2=0.000, $fn=10, center=false);
            } // End rotate
            } // End translate
          } // End union
        } // End rotate
        } // End translate
      } // End color
      color([0.000, 0.000, 1.000, 1.000]) {
        union() {
          cylinder(h=7.000, r1=0.500, r2=0.500, $fn=10, center=false);
          translate(v=[0.000, 0.000, 7.000]) {
          rotate([-180.000,-180.000,-180.000]){
            cylinder(h=3.000, r1=1.000, r2=0.000, $fn=10, center=false);
          } // End rotate
          } // End translate
        } // End union
      } // End color
    } // End union
  } // End rotate
  } // End translate
  translate(v=[-15.000, -5.000, 15.000]) {
  rotate([45.000,180.000,0.000]){
    union() {
      color([1.000, 0.000, 0.000, 1.000]) {
        translate(v=[0.000, 0.000, 0.000]) {
        rotate([-180.000,90.000,-180.000]){
          union() {
            cylinder(h=7.000, r1=0.500, r2=0.500, $fn=10, center=false);
            translate(v=[0.000, 0.000, 7.000]) {
            rotate([-180.000,-180.000,-180.000]){
              cylinder(h=3.000, r1=1.000, r2=0.000, $fn=10, center=false);
            } // End rotate
            } // End translate
          } // End union
        } // End rotate
        } // End translate
      } // End color
      color([0.000, 1.000, 0.000, 1.000]) {
        translate(v=[0.000, 0.000, 0.000]) {
        rotate([90.000,-180.000,-180.000]){
          union() {
            cylinder(h=7.000, r1=0.500, r2=0.500, $fn=10, center=false);
            translate(v=[0.000, 0.000, 7.000]) {
            rotate([-180.000,-180.000,-180.000]){
              cylinder(h=3.000, r1=1.000, r2=0.000, $fn=10, center=false);
            } // End rotate
            } // End translate
          } // End union
        } // End rotate
        } // End translate
      } // End color
      color([0.000, 0.000, 1.000, 1.000]) {
        union() {
          cylinder(h=7.000, r1=0.500, r2=0.500, $fn=10, center=false);
          translate(v=[0.000, 0.000, 7.000]) {
          rotate([-180.000,-180.000,-180.000]){
            cylinder(h=3.000, r1=1.000, r2=0.000, $fn=10, center=false);
          } // End rotate
          } // End translate
        } // End union
      } // End color
    } // End union
  } // End rotate
  } // End translate
  translate(v=[-15.000, 5.000, 15.000]) {
  rotate([-45.000,180.000,0.000]){
    union() {
      color([1.000, 0.000, 0.000, 1.000]) {
        translate(v=[0.000, 0.000, 0.000]) {
        rotate([-180.000,90.000,-180.000]){
          union() {
            cylinder(h=7.000, r1=0.500, r2=0.500, $fn=10, center=false);
            translate(v=[0.000, 0.000, 7.000]) {
            rotate([-180.000,-180.000,-180.000]){
              cylinder(h=3.000, r1=1.000, r2=0.000, $fn=10, center=false);
            } // End rotate
            } // End translate
          } // End union
        } // End rotate
        } // End translate
      } // End color
      color([0.000, 1.000, 0.000, 1.000]) {
        translate(v=[0.000, 0.000, 0.000]) {
        rotate([90.000,-180.000,-180.000]){
          union() {
            cylinder(h=7.000, r1=0.500, r2=0.500, $fn=10, center=false);
            translate(v=[0.000, 0.000, 7.000]) {
            rotate([-180.000,-180.000,-180.000]){
              cylinder(h=3.000, r1=1.000, r2=0.000, $fn=10, center=false);
            } // End rotate
            } // End translate
          } // End union
        } // End rotate
        } // End translate
      } // End color
      color([0.000, 0.000, 1.000, 1.000]) {
        union() {
          cylinder(h=7.000, r1=0.500, r2=0.500, $fn=10, center=false);
          translate(v=[0.000, 0.000, 7.000]) {
          rotate([-180.000,-180.000,-180.000]){
            cylinder(h=3.000, r1=1.000, r2=0.000, $fn=10, center=false);
          } // End rotate
          } // End translate
        } // End union
      } // End color
    } // End union
  } // End rotate
  } // End translate
} // End union
union() {
  translate(v=[0.000, 0.000, 20.000]) {
  rotate([-180.000,-180.000,-180.000]){
    color([1.000, 0.000, 0.000, 1.000]) {
      translate(v=[40.000, 0.000, 0.000]) {
      rotate([-180.000,-180.000,-180.000]){
        union() {
          translate(v=[-10.000, 0.000, 0.000]) {
          rotate([-180.000,-180.000,-180.000]){
            cube(size=[10.000, 10.000, 10.000], center=true);
          } // End rotate
          } // End translate
          cube(size=[5.000, 5.000, 20.000], center=true);
        } // End union
      } // End rotate
      } // End translate
    } // End color
  } // End rotate
  } // End translate
  translate(v=[-5.000, -5.000, 15.000]) {
  rotate([-45.000,-180.000,-180.000]){
    cube(size=[5.000, 5.000, 1.000], center=true);
  } // End rotate
  } // End translate
  translate(v=[-5.000, 5.000, 15.000]) {
  rotate([45.000,-180.000,-180.000]){
    cube(size=[5.000, 5.000, 1.000], center=true);
  } // End rotate
  } // End translate
  translate(v=[-5.000, 5.000, 25.000]) {
  rotate([135.000,-180.000,-180.000]){
    cube(size=[5.000, 5.000, 1.000], center=true);
  } // End rotate
  } // End translate
  translate(v=[-5.000, -5.000, 25.000]) {
  rotate([-135.000,-180.000,-180.000]){
    cube(size=[5.000, 5.000, 1.000], center=true);
  } // End rotate
  } // End translate
  translate(v=[-15.000, 5.000, 25.000]) {
  rotate([-135.000,180.000,0.000]){
    cube(size=[5.000, 5.000, 1.000], center=true);
  } // End rotate
  } // End translate
  translate(v=[-15.000, -5.000, 25.000]) {
  rotate([135.000,180.000,0.000]){
    cube(size=[5.000, 5.000, 1.000], center=true);
  } // End rotate
  } // End translate
  translate(v=[-15.000, -5.000, 15.000]) {
  rotate([45.000,180.000,0.000]){
    cube(size=[5.000, 5.000, 1.000], center=true);
  } // End rotate
  } // End translate
  translate(v=[-15.000, 5.000, 15.000]) {
  rotate([-45.000,180.000,0.000]){
    cube(size=[5.000, 5.000, 1.000], center=true);
  } // End rotate
  } // End translate
} // End union
